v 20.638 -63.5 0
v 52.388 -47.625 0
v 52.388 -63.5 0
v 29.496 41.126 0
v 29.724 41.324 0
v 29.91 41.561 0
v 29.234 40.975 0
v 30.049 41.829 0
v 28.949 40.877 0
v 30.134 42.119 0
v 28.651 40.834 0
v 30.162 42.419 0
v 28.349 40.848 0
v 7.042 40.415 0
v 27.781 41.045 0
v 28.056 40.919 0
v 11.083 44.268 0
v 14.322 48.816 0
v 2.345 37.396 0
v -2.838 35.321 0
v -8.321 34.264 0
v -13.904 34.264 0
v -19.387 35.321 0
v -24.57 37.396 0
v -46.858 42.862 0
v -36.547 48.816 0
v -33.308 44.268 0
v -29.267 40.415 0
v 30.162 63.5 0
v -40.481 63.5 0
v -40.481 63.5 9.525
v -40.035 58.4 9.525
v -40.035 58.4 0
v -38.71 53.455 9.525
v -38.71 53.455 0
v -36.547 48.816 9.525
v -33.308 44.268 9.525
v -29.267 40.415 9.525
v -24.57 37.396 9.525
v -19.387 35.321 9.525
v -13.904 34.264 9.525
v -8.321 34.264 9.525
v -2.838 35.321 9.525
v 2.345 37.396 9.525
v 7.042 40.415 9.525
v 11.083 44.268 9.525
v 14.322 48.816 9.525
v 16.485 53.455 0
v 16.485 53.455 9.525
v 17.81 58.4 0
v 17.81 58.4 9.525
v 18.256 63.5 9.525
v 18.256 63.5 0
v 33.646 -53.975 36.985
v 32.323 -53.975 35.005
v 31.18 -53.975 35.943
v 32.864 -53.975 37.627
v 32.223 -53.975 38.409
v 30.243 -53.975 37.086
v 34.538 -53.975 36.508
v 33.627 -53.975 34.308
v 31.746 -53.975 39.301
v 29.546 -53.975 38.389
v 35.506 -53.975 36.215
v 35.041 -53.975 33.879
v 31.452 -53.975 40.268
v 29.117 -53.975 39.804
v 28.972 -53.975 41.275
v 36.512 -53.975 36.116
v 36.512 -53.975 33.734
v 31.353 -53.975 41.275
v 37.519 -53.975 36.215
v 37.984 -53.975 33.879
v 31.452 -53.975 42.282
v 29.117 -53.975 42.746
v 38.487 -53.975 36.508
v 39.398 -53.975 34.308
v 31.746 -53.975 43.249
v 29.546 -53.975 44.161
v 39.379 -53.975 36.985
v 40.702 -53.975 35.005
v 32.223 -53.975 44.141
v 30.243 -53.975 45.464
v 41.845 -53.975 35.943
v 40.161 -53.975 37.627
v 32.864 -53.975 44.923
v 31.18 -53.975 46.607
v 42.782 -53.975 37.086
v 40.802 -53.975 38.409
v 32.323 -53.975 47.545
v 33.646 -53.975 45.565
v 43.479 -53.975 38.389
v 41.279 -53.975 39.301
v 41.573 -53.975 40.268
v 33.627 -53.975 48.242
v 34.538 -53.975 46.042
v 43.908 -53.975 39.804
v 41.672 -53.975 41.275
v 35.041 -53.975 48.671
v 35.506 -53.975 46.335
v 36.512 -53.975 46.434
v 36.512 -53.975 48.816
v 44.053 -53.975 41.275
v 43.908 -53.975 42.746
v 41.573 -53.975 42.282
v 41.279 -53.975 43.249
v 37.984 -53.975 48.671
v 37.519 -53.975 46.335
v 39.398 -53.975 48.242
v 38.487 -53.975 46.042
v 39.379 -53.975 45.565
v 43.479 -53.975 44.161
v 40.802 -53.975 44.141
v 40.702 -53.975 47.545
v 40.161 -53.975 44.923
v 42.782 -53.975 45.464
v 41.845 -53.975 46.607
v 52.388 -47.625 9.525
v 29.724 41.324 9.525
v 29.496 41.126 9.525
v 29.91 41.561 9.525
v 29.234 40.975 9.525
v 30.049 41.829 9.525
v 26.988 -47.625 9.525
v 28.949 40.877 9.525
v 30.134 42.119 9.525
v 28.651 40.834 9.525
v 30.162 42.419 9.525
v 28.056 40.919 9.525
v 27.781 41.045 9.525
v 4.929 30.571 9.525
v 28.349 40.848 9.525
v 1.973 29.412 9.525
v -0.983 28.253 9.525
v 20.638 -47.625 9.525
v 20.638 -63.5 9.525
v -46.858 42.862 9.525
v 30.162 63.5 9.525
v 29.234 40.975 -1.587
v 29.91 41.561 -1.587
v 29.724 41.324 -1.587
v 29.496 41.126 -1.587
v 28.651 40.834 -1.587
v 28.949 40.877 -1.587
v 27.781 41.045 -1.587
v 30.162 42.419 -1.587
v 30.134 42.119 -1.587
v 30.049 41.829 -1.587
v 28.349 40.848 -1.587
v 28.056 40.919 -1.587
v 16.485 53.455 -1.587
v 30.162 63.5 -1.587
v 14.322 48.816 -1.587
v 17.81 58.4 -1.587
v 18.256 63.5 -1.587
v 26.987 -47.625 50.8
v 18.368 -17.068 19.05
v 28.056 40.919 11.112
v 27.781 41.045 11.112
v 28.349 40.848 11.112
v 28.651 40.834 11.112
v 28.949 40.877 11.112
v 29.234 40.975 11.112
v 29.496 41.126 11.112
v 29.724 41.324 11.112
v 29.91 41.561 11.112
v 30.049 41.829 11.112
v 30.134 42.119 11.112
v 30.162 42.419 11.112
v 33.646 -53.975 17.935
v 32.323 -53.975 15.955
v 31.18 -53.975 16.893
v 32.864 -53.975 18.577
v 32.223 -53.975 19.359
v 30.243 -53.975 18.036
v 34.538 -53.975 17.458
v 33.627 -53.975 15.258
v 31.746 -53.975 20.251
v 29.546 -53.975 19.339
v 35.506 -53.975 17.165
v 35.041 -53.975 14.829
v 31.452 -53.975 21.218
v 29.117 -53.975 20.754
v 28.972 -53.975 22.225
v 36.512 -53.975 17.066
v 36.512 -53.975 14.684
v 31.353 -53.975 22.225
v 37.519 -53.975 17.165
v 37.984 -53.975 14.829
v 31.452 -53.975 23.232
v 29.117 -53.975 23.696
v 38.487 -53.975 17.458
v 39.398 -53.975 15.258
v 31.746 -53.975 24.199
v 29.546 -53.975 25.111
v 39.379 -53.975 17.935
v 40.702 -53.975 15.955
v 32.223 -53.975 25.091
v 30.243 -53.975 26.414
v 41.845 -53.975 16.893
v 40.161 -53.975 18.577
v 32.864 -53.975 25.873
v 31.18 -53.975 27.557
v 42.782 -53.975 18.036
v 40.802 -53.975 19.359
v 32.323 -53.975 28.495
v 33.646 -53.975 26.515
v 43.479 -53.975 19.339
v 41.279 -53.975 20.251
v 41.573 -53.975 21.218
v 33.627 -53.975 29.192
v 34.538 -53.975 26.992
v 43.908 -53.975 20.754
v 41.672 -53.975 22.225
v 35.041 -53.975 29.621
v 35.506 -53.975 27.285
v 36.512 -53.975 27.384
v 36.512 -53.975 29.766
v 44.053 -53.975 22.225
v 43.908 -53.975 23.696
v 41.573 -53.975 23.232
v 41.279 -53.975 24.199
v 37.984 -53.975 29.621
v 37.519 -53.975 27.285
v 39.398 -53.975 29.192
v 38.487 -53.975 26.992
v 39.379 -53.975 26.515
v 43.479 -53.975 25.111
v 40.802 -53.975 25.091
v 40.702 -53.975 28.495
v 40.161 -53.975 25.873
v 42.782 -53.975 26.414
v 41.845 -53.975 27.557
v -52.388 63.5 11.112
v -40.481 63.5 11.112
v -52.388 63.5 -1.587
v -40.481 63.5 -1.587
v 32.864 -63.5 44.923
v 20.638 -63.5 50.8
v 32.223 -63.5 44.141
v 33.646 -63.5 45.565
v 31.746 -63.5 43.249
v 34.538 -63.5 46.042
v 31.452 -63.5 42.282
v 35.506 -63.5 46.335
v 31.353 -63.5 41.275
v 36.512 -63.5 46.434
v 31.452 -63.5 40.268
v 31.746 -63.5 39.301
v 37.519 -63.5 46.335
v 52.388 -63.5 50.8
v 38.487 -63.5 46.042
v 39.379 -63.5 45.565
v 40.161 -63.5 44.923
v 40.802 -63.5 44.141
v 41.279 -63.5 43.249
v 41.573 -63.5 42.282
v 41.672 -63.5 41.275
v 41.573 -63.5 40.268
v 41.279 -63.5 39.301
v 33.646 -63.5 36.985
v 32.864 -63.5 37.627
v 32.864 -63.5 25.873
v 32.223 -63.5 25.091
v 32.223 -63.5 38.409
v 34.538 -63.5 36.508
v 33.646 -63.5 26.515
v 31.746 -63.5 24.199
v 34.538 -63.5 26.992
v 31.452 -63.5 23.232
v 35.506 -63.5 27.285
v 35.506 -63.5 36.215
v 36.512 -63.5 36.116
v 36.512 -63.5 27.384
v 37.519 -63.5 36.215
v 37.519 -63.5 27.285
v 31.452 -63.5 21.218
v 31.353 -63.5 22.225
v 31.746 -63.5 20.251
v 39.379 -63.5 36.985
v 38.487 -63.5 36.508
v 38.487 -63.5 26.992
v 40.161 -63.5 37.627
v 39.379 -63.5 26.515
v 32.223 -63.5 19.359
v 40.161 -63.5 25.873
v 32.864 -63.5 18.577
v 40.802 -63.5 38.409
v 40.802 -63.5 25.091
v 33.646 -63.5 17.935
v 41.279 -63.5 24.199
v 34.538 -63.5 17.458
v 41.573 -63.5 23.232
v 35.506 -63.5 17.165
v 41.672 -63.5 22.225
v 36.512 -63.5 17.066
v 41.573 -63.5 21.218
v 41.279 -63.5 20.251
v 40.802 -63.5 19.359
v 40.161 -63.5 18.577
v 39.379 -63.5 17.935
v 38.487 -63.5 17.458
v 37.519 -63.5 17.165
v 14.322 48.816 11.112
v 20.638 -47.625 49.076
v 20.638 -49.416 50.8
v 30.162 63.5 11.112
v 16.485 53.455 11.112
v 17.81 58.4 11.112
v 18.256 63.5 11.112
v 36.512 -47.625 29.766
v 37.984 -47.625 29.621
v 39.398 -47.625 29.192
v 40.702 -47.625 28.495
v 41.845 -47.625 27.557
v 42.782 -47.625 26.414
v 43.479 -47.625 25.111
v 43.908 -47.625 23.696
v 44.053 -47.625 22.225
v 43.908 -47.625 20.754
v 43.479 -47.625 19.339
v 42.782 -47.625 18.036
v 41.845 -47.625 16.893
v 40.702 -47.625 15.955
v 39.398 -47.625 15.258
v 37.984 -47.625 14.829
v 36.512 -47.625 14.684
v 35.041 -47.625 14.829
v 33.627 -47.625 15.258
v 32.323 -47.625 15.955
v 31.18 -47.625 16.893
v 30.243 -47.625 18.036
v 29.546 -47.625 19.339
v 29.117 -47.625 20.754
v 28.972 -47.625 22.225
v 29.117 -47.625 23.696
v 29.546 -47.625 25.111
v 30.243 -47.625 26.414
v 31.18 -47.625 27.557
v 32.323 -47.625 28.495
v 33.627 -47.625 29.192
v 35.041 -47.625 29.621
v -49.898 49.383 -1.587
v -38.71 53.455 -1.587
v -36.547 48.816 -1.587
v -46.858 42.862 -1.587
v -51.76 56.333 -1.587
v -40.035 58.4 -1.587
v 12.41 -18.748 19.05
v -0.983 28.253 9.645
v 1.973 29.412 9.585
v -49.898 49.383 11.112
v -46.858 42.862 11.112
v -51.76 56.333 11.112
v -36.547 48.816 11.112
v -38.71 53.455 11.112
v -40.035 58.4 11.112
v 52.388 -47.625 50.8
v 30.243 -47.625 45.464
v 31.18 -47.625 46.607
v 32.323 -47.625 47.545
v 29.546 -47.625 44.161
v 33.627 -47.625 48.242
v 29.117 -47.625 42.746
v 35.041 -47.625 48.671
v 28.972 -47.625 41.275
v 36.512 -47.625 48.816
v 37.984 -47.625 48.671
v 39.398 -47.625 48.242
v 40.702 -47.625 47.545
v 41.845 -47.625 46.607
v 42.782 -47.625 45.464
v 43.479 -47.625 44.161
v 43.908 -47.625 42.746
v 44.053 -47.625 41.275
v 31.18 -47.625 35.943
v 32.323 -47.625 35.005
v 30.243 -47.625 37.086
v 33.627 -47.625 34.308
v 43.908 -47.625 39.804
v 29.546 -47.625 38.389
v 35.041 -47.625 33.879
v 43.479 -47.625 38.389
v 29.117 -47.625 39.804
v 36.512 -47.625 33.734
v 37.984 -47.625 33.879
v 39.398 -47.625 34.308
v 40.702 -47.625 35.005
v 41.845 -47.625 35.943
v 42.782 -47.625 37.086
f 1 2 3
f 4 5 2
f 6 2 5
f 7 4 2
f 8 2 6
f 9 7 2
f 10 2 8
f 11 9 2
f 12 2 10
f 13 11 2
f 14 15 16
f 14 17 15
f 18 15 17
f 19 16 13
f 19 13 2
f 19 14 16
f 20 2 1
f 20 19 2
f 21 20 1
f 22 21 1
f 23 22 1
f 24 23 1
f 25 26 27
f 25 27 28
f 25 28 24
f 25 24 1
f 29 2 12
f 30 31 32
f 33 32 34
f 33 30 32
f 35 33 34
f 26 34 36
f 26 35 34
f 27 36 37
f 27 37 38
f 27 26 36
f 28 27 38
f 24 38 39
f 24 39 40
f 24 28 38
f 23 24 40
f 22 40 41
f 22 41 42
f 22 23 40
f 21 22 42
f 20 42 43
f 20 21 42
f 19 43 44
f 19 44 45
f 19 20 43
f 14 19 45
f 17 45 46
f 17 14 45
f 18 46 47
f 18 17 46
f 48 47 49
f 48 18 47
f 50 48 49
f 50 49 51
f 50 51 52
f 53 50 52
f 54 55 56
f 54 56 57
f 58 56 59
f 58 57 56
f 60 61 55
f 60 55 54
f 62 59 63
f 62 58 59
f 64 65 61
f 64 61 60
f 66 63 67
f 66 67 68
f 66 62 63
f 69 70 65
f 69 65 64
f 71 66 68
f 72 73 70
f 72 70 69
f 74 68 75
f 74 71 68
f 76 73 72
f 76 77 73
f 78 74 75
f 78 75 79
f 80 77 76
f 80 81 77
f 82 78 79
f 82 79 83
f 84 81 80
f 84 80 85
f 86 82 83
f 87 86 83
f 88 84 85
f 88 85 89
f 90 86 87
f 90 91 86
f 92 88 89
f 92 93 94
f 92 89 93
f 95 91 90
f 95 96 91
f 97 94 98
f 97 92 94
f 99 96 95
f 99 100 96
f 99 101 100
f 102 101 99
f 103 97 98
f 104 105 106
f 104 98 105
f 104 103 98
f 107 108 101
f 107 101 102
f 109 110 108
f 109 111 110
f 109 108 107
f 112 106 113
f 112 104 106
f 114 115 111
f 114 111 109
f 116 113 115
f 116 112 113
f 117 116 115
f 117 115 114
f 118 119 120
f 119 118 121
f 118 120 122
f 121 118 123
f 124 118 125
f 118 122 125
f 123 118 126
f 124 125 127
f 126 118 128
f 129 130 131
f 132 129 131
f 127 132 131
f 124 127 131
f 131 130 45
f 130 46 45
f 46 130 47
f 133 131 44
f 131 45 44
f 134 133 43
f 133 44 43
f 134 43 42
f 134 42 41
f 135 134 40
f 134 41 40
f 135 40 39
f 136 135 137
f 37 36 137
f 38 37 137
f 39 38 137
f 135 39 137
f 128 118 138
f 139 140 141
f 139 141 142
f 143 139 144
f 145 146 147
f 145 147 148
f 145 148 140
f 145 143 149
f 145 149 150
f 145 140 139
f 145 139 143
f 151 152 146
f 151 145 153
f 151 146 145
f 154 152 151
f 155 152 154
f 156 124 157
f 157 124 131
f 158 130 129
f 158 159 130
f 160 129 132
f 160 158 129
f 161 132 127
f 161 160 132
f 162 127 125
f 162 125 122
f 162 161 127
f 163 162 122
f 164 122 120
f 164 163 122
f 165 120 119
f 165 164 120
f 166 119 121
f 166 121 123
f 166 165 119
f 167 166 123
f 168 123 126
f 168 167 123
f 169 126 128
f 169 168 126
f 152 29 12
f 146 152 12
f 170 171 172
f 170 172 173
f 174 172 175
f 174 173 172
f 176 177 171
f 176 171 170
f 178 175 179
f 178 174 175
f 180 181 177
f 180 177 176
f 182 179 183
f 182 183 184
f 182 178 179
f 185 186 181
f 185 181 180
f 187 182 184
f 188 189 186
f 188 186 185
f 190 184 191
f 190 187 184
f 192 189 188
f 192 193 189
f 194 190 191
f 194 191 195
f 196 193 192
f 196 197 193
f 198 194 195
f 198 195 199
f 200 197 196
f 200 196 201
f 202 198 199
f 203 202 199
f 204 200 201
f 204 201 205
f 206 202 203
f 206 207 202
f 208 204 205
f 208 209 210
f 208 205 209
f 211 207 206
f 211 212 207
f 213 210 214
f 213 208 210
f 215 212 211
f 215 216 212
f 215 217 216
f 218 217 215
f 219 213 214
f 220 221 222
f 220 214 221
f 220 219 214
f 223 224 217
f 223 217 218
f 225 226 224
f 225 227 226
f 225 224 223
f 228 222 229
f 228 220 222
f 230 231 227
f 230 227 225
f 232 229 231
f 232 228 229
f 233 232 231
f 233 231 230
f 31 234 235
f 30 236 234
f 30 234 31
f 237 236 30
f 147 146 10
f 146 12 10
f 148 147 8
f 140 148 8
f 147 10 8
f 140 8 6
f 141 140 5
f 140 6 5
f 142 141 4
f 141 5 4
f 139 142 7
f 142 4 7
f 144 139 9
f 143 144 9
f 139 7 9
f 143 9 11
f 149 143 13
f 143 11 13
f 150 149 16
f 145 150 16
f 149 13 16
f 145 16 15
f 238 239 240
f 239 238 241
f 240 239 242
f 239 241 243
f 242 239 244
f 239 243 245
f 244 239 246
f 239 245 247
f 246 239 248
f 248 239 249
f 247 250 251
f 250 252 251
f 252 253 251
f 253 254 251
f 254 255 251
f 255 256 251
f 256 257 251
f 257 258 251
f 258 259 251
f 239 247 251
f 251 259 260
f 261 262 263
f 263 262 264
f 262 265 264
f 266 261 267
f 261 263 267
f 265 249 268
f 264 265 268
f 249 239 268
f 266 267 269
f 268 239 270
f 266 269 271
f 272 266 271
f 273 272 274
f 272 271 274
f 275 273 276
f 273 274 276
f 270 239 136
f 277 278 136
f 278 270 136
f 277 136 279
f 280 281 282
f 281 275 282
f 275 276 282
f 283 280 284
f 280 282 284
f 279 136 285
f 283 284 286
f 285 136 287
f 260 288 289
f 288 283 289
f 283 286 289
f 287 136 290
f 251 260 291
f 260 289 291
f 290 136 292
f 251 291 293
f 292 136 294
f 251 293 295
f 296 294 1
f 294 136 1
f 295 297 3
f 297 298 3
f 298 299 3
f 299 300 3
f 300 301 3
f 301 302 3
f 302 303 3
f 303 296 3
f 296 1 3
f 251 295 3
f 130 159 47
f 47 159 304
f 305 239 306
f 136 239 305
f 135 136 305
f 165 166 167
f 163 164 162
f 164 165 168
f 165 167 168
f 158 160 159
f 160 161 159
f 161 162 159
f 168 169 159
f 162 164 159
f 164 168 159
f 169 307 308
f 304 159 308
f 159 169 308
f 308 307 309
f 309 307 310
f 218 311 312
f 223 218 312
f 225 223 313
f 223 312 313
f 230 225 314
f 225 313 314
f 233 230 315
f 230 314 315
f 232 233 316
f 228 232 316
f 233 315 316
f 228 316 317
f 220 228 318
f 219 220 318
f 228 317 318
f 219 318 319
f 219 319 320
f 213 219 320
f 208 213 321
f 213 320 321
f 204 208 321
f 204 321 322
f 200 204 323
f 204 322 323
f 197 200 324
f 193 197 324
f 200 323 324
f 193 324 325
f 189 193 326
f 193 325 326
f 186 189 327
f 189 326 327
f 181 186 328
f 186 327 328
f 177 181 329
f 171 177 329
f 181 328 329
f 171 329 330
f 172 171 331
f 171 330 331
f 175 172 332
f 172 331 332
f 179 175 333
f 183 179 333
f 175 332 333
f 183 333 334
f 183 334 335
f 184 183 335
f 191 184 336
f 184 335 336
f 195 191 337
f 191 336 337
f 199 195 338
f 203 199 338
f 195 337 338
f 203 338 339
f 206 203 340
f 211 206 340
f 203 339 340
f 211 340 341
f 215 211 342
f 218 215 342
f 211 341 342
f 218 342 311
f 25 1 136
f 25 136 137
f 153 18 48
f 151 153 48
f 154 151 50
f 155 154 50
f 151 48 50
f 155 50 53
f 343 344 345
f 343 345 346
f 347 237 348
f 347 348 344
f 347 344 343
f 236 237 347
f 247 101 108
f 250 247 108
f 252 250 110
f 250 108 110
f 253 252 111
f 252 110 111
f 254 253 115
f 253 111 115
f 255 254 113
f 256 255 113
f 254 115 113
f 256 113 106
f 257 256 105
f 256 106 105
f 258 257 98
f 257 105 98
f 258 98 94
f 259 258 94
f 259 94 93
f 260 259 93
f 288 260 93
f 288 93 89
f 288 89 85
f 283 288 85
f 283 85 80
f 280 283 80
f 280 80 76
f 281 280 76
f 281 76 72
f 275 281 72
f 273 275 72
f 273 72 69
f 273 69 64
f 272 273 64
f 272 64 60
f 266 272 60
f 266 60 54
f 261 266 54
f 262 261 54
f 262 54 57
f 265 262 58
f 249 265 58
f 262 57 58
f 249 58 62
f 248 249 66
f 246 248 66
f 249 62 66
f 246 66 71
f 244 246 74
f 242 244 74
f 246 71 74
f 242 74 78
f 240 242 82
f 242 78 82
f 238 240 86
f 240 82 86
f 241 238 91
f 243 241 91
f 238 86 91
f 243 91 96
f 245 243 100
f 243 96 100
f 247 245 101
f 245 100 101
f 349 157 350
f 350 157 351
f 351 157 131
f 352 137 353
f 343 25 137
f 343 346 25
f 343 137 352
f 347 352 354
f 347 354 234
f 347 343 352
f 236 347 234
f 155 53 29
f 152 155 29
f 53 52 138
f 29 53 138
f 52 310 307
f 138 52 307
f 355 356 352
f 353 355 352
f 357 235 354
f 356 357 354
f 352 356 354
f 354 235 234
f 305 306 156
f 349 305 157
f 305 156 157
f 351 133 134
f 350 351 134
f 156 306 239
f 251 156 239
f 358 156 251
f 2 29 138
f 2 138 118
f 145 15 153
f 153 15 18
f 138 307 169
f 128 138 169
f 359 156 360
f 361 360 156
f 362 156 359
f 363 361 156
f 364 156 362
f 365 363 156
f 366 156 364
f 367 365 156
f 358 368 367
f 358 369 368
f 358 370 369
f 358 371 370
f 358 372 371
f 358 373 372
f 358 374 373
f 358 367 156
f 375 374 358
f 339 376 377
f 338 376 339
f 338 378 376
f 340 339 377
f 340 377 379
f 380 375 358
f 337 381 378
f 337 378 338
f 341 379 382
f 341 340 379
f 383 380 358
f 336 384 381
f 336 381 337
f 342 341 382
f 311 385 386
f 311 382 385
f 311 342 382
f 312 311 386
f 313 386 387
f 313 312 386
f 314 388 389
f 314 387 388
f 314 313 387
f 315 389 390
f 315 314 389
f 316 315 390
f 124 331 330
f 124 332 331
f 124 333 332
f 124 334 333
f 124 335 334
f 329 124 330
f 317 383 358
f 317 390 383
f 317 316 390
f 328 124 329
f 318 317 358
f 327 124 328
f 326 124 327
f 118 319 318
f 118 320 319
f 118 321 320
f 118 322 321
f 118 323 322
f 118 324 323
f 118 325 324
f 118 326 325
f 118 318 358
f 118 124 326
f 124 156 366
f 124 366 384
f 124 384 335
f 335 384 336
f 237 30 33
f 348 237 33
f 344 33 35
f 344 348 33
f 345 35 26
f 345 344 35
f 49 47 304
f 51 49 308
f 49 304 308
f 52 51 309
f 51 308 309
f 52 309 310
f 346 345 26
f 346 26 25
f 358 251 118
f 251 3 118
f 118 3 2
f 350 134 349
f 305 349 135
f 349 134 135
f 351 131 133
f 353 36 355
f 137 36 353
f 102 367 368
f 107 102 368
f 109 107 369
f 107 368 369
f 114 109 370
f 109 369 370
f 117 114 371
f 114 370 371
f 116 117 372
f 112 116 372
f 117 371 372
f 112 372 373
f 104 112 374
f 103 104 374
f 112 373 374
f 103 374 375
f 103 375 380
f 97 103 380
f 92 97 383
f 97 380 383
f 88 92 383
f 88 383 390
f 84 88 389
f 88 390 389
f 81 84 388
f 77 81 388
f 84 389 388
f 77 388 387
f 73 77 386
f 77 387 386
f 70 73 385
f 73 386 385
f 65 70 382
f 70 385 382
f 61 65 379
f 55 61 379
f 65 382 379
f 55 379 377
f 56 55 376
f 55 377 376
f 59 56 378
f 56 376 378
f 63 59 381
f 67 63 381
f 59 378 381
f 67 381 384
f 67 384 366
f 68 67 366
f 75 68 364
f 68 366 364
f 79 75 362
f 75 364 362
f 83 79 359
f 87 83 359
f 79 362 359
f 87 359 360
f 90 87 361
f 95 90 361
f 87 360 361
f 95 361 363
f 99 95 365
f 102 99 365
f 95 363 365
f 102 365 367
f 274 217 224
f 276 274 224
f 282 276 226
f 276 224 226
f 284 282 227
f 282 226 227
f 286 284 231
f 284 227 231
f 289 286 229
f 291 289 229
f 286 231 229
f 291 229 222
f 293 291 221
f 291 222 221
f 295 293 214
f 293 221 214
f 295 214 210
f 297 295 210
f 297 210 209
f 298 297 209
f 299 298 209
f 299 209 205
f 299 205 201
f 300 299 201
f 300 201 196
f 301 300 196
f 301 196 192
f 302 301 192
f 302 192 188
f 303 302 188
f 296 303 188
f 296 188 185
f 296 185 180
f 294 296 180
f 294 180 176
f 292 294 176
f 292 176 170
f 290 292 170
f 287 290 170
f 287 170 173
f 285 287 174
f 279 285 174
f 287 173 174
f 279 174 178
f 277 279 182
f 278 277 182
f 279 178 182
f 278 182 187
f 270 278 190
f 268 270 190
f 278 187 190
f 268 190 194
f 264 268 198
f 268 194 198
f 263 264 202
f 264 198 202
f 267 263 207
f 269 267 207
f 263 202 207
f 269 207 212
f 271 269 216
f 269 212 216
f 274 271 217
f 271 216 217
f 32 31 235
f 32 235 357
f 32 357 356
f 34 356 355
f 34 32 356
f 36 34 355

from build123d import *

# Parameters (mm, degrees)
SALIENTE_EXTRUIR1_DEPTH = 9.525
CROQUIS2_W              = 31.75
CROQUIS2_H              = 15.875
SALIENTE_EXTRUIR2_DEPTH = 41.275
CROQUIS3_R              = 5.159375
CORTAR_EXTRUIR1_DEPTH   = 133.943055
CROQUIS4_R              = 7.540625
CORTAR_EXTRUIR2_DEPTH   = 6.35
SALIENTE_EXTRUIR5_DEPTH = 6.35
REDONDEO1_R             = 1.5875
REDONDEO4_R             = 1.5875
SALIENTE_EXTRUIR8_DEPTH = 41.275
CORTAR_EXTRUIR4_DEPTH   = 41.275


with BuildPart() as part:
    # Croquis1 → Saliente-Extruir1 (new body)
    with BuildSketch(Plane.XY):
        with BuildLine():
            Line((-52.3875, 63.5), (-40.48125, 63.5))
            ThreePointArc((-40.48125, 63.5), (-11.1125, 34.13125), (18.25625, 63.5))
            Line((18.25625, 63.5), (30.1625, 63.5))
            Line((30.1625, 63.5), (52.3875, -47.625))
            Line((52.3875, -47.625), (52.3875, -63.5))
            Line((52.3875, -63.5), (20.6375, -63.5))
            Line((20.6375, -63.5), (-46.857699, 42.8625))
            ThreePointArc((-46.857699, 42.8625), (-50.981088, 52.817244), (-52.3875, 63.5))
        make_face()
    extrude(amount=SALIENTE_EXTRUIR1_DEPTH)

    # Croquis2 → Saliente-Extruir2 (add)
    with BuildSketch(Plane.XY.offset(9.525)):
        with Locations((36.5125, -55.5625)):
            Rectangle(CROQUIS2_W, CROQUIS2_H)
    extrude(amount=SALIENTE_EXTRUIR2_DEPTH)

    # Croquis3 → Cortar-Extruir1 (cut, through all)
    with BuildSketch(Plane(origin=(0, -47.625, 0), x_dir=(1, 0, 0), z_dir=(0, 1, 0))):
        with Locations(Location((36.5125, -41.275, 0), (0, 0, 270))):
            Circle(CROQUIS3_R)
        with Locations(Location((36.5125, -22.225, 0), (0, 0, 270))):
            Circle(CROQUIS3_R)
    extrude(amount=-CORTAR_EXTRUIR1_DEPTH, mode=Mode.SUBTRACT)

    # Croquis4 → Cortar-Extruir2 (cut)
    with BuildSketch(Plane(origin=(0, -47.625, 0), x_dir=(1, 0, 0), z_dir=(0, 1, 0))):
        with Locations(Location((36.5125, -22.225, 0), (0, 0, 270))):
            Circle(CROQUIS4_R)
        with Locations(Location((36.5125, -41.275, 0), (0, 0, 270))):
            Circle(CROQUIS4_R)
    extrude(amount=-CORTAR_EXTRUIR2_DEPTH, mode=Mode.SUBTRACT)

    # Croquis8 → Saliente-Extruir5 (add, symmetric)
    with BuildSketch(Plane.XY.offset(4.7625)):
        with BuildLine():
            Line((-52.3875, 63.5), (-40.48125, 63.5))
            ThreePointArc((-40.48125, 63.5), (-39.480534, 55.898808), (-36.546584, 48.815625))
            Line((-36.546584, 48.815625), (-46.857699, 42.8625))
            ThreePointArc((-46.857699, 42.8625), (-50.981088, 52.817244), (-52.3875, 63.5))
        make_face()
        with BuildLine():
            ThreePointArc((14.321584, 48.815625), (17.255534, 55.898808), (18.25625, 63.5))
            Line((18.25625, 63.5), (30.1625, 63.5))
            Line((30.1625, 63.5), (30.1625, 39.669868))
            Line((30.1625, 39.669868), (14.321584, 48.815625))
        make_face()
    extrude(amount=SALIENTE_EXTRUIR5_DEPTH, both=True)

    # Redondeo1
    redondeo1_edges = [part.edges().sort_by_distance(p)[0] for p in [
        (30.1625, 39.669868, 10.31875),
    ]]
    fillet(redondeo1_edges, radius=REDONDEO1_R)

    # Redondeo4
    redondeo4_edges = [part.edges().sort_by_distance(p)[0] for p in [
        (30.1625, 39.669868, -0.79375),
    ]]
    fillet(redondeo4_edges, radius=REDONDEO4_R)

    # Croquis9 → Saliente-Extruir8 (add)
    with BuildSketch(Plane.XY.offset(9.525)):
        Polygon((-0.982547, 28.253318), (20.6375, -47.625), (23.8125, -47.625), (26.9875, -47.625), (4.929446, 30.570825), (1.97345, 29.412071), align=None)
    extrude(amount=SALIENTE_EXTRUIR8_DEPTH)

    # Croquis12 → Cortar-Extruir4 (cut)
    with BuildSketch(Plane(origin=(12.554117, 3.541358, 0), x_dir=(0, 0, -1), z_dir=(0.9624406031715071, 0.27149233021738517, 0))):
        Polygon((-9.525, 28.084296), (-50.8, 28.084296), (-50.8, -53.163133), (-19.05, -21.413133), align=None)
    extrude(amount=-CORTAR_EXTRUIR4_DEPTH, mode=Mode.SUBTRACT)


solid = part.part
